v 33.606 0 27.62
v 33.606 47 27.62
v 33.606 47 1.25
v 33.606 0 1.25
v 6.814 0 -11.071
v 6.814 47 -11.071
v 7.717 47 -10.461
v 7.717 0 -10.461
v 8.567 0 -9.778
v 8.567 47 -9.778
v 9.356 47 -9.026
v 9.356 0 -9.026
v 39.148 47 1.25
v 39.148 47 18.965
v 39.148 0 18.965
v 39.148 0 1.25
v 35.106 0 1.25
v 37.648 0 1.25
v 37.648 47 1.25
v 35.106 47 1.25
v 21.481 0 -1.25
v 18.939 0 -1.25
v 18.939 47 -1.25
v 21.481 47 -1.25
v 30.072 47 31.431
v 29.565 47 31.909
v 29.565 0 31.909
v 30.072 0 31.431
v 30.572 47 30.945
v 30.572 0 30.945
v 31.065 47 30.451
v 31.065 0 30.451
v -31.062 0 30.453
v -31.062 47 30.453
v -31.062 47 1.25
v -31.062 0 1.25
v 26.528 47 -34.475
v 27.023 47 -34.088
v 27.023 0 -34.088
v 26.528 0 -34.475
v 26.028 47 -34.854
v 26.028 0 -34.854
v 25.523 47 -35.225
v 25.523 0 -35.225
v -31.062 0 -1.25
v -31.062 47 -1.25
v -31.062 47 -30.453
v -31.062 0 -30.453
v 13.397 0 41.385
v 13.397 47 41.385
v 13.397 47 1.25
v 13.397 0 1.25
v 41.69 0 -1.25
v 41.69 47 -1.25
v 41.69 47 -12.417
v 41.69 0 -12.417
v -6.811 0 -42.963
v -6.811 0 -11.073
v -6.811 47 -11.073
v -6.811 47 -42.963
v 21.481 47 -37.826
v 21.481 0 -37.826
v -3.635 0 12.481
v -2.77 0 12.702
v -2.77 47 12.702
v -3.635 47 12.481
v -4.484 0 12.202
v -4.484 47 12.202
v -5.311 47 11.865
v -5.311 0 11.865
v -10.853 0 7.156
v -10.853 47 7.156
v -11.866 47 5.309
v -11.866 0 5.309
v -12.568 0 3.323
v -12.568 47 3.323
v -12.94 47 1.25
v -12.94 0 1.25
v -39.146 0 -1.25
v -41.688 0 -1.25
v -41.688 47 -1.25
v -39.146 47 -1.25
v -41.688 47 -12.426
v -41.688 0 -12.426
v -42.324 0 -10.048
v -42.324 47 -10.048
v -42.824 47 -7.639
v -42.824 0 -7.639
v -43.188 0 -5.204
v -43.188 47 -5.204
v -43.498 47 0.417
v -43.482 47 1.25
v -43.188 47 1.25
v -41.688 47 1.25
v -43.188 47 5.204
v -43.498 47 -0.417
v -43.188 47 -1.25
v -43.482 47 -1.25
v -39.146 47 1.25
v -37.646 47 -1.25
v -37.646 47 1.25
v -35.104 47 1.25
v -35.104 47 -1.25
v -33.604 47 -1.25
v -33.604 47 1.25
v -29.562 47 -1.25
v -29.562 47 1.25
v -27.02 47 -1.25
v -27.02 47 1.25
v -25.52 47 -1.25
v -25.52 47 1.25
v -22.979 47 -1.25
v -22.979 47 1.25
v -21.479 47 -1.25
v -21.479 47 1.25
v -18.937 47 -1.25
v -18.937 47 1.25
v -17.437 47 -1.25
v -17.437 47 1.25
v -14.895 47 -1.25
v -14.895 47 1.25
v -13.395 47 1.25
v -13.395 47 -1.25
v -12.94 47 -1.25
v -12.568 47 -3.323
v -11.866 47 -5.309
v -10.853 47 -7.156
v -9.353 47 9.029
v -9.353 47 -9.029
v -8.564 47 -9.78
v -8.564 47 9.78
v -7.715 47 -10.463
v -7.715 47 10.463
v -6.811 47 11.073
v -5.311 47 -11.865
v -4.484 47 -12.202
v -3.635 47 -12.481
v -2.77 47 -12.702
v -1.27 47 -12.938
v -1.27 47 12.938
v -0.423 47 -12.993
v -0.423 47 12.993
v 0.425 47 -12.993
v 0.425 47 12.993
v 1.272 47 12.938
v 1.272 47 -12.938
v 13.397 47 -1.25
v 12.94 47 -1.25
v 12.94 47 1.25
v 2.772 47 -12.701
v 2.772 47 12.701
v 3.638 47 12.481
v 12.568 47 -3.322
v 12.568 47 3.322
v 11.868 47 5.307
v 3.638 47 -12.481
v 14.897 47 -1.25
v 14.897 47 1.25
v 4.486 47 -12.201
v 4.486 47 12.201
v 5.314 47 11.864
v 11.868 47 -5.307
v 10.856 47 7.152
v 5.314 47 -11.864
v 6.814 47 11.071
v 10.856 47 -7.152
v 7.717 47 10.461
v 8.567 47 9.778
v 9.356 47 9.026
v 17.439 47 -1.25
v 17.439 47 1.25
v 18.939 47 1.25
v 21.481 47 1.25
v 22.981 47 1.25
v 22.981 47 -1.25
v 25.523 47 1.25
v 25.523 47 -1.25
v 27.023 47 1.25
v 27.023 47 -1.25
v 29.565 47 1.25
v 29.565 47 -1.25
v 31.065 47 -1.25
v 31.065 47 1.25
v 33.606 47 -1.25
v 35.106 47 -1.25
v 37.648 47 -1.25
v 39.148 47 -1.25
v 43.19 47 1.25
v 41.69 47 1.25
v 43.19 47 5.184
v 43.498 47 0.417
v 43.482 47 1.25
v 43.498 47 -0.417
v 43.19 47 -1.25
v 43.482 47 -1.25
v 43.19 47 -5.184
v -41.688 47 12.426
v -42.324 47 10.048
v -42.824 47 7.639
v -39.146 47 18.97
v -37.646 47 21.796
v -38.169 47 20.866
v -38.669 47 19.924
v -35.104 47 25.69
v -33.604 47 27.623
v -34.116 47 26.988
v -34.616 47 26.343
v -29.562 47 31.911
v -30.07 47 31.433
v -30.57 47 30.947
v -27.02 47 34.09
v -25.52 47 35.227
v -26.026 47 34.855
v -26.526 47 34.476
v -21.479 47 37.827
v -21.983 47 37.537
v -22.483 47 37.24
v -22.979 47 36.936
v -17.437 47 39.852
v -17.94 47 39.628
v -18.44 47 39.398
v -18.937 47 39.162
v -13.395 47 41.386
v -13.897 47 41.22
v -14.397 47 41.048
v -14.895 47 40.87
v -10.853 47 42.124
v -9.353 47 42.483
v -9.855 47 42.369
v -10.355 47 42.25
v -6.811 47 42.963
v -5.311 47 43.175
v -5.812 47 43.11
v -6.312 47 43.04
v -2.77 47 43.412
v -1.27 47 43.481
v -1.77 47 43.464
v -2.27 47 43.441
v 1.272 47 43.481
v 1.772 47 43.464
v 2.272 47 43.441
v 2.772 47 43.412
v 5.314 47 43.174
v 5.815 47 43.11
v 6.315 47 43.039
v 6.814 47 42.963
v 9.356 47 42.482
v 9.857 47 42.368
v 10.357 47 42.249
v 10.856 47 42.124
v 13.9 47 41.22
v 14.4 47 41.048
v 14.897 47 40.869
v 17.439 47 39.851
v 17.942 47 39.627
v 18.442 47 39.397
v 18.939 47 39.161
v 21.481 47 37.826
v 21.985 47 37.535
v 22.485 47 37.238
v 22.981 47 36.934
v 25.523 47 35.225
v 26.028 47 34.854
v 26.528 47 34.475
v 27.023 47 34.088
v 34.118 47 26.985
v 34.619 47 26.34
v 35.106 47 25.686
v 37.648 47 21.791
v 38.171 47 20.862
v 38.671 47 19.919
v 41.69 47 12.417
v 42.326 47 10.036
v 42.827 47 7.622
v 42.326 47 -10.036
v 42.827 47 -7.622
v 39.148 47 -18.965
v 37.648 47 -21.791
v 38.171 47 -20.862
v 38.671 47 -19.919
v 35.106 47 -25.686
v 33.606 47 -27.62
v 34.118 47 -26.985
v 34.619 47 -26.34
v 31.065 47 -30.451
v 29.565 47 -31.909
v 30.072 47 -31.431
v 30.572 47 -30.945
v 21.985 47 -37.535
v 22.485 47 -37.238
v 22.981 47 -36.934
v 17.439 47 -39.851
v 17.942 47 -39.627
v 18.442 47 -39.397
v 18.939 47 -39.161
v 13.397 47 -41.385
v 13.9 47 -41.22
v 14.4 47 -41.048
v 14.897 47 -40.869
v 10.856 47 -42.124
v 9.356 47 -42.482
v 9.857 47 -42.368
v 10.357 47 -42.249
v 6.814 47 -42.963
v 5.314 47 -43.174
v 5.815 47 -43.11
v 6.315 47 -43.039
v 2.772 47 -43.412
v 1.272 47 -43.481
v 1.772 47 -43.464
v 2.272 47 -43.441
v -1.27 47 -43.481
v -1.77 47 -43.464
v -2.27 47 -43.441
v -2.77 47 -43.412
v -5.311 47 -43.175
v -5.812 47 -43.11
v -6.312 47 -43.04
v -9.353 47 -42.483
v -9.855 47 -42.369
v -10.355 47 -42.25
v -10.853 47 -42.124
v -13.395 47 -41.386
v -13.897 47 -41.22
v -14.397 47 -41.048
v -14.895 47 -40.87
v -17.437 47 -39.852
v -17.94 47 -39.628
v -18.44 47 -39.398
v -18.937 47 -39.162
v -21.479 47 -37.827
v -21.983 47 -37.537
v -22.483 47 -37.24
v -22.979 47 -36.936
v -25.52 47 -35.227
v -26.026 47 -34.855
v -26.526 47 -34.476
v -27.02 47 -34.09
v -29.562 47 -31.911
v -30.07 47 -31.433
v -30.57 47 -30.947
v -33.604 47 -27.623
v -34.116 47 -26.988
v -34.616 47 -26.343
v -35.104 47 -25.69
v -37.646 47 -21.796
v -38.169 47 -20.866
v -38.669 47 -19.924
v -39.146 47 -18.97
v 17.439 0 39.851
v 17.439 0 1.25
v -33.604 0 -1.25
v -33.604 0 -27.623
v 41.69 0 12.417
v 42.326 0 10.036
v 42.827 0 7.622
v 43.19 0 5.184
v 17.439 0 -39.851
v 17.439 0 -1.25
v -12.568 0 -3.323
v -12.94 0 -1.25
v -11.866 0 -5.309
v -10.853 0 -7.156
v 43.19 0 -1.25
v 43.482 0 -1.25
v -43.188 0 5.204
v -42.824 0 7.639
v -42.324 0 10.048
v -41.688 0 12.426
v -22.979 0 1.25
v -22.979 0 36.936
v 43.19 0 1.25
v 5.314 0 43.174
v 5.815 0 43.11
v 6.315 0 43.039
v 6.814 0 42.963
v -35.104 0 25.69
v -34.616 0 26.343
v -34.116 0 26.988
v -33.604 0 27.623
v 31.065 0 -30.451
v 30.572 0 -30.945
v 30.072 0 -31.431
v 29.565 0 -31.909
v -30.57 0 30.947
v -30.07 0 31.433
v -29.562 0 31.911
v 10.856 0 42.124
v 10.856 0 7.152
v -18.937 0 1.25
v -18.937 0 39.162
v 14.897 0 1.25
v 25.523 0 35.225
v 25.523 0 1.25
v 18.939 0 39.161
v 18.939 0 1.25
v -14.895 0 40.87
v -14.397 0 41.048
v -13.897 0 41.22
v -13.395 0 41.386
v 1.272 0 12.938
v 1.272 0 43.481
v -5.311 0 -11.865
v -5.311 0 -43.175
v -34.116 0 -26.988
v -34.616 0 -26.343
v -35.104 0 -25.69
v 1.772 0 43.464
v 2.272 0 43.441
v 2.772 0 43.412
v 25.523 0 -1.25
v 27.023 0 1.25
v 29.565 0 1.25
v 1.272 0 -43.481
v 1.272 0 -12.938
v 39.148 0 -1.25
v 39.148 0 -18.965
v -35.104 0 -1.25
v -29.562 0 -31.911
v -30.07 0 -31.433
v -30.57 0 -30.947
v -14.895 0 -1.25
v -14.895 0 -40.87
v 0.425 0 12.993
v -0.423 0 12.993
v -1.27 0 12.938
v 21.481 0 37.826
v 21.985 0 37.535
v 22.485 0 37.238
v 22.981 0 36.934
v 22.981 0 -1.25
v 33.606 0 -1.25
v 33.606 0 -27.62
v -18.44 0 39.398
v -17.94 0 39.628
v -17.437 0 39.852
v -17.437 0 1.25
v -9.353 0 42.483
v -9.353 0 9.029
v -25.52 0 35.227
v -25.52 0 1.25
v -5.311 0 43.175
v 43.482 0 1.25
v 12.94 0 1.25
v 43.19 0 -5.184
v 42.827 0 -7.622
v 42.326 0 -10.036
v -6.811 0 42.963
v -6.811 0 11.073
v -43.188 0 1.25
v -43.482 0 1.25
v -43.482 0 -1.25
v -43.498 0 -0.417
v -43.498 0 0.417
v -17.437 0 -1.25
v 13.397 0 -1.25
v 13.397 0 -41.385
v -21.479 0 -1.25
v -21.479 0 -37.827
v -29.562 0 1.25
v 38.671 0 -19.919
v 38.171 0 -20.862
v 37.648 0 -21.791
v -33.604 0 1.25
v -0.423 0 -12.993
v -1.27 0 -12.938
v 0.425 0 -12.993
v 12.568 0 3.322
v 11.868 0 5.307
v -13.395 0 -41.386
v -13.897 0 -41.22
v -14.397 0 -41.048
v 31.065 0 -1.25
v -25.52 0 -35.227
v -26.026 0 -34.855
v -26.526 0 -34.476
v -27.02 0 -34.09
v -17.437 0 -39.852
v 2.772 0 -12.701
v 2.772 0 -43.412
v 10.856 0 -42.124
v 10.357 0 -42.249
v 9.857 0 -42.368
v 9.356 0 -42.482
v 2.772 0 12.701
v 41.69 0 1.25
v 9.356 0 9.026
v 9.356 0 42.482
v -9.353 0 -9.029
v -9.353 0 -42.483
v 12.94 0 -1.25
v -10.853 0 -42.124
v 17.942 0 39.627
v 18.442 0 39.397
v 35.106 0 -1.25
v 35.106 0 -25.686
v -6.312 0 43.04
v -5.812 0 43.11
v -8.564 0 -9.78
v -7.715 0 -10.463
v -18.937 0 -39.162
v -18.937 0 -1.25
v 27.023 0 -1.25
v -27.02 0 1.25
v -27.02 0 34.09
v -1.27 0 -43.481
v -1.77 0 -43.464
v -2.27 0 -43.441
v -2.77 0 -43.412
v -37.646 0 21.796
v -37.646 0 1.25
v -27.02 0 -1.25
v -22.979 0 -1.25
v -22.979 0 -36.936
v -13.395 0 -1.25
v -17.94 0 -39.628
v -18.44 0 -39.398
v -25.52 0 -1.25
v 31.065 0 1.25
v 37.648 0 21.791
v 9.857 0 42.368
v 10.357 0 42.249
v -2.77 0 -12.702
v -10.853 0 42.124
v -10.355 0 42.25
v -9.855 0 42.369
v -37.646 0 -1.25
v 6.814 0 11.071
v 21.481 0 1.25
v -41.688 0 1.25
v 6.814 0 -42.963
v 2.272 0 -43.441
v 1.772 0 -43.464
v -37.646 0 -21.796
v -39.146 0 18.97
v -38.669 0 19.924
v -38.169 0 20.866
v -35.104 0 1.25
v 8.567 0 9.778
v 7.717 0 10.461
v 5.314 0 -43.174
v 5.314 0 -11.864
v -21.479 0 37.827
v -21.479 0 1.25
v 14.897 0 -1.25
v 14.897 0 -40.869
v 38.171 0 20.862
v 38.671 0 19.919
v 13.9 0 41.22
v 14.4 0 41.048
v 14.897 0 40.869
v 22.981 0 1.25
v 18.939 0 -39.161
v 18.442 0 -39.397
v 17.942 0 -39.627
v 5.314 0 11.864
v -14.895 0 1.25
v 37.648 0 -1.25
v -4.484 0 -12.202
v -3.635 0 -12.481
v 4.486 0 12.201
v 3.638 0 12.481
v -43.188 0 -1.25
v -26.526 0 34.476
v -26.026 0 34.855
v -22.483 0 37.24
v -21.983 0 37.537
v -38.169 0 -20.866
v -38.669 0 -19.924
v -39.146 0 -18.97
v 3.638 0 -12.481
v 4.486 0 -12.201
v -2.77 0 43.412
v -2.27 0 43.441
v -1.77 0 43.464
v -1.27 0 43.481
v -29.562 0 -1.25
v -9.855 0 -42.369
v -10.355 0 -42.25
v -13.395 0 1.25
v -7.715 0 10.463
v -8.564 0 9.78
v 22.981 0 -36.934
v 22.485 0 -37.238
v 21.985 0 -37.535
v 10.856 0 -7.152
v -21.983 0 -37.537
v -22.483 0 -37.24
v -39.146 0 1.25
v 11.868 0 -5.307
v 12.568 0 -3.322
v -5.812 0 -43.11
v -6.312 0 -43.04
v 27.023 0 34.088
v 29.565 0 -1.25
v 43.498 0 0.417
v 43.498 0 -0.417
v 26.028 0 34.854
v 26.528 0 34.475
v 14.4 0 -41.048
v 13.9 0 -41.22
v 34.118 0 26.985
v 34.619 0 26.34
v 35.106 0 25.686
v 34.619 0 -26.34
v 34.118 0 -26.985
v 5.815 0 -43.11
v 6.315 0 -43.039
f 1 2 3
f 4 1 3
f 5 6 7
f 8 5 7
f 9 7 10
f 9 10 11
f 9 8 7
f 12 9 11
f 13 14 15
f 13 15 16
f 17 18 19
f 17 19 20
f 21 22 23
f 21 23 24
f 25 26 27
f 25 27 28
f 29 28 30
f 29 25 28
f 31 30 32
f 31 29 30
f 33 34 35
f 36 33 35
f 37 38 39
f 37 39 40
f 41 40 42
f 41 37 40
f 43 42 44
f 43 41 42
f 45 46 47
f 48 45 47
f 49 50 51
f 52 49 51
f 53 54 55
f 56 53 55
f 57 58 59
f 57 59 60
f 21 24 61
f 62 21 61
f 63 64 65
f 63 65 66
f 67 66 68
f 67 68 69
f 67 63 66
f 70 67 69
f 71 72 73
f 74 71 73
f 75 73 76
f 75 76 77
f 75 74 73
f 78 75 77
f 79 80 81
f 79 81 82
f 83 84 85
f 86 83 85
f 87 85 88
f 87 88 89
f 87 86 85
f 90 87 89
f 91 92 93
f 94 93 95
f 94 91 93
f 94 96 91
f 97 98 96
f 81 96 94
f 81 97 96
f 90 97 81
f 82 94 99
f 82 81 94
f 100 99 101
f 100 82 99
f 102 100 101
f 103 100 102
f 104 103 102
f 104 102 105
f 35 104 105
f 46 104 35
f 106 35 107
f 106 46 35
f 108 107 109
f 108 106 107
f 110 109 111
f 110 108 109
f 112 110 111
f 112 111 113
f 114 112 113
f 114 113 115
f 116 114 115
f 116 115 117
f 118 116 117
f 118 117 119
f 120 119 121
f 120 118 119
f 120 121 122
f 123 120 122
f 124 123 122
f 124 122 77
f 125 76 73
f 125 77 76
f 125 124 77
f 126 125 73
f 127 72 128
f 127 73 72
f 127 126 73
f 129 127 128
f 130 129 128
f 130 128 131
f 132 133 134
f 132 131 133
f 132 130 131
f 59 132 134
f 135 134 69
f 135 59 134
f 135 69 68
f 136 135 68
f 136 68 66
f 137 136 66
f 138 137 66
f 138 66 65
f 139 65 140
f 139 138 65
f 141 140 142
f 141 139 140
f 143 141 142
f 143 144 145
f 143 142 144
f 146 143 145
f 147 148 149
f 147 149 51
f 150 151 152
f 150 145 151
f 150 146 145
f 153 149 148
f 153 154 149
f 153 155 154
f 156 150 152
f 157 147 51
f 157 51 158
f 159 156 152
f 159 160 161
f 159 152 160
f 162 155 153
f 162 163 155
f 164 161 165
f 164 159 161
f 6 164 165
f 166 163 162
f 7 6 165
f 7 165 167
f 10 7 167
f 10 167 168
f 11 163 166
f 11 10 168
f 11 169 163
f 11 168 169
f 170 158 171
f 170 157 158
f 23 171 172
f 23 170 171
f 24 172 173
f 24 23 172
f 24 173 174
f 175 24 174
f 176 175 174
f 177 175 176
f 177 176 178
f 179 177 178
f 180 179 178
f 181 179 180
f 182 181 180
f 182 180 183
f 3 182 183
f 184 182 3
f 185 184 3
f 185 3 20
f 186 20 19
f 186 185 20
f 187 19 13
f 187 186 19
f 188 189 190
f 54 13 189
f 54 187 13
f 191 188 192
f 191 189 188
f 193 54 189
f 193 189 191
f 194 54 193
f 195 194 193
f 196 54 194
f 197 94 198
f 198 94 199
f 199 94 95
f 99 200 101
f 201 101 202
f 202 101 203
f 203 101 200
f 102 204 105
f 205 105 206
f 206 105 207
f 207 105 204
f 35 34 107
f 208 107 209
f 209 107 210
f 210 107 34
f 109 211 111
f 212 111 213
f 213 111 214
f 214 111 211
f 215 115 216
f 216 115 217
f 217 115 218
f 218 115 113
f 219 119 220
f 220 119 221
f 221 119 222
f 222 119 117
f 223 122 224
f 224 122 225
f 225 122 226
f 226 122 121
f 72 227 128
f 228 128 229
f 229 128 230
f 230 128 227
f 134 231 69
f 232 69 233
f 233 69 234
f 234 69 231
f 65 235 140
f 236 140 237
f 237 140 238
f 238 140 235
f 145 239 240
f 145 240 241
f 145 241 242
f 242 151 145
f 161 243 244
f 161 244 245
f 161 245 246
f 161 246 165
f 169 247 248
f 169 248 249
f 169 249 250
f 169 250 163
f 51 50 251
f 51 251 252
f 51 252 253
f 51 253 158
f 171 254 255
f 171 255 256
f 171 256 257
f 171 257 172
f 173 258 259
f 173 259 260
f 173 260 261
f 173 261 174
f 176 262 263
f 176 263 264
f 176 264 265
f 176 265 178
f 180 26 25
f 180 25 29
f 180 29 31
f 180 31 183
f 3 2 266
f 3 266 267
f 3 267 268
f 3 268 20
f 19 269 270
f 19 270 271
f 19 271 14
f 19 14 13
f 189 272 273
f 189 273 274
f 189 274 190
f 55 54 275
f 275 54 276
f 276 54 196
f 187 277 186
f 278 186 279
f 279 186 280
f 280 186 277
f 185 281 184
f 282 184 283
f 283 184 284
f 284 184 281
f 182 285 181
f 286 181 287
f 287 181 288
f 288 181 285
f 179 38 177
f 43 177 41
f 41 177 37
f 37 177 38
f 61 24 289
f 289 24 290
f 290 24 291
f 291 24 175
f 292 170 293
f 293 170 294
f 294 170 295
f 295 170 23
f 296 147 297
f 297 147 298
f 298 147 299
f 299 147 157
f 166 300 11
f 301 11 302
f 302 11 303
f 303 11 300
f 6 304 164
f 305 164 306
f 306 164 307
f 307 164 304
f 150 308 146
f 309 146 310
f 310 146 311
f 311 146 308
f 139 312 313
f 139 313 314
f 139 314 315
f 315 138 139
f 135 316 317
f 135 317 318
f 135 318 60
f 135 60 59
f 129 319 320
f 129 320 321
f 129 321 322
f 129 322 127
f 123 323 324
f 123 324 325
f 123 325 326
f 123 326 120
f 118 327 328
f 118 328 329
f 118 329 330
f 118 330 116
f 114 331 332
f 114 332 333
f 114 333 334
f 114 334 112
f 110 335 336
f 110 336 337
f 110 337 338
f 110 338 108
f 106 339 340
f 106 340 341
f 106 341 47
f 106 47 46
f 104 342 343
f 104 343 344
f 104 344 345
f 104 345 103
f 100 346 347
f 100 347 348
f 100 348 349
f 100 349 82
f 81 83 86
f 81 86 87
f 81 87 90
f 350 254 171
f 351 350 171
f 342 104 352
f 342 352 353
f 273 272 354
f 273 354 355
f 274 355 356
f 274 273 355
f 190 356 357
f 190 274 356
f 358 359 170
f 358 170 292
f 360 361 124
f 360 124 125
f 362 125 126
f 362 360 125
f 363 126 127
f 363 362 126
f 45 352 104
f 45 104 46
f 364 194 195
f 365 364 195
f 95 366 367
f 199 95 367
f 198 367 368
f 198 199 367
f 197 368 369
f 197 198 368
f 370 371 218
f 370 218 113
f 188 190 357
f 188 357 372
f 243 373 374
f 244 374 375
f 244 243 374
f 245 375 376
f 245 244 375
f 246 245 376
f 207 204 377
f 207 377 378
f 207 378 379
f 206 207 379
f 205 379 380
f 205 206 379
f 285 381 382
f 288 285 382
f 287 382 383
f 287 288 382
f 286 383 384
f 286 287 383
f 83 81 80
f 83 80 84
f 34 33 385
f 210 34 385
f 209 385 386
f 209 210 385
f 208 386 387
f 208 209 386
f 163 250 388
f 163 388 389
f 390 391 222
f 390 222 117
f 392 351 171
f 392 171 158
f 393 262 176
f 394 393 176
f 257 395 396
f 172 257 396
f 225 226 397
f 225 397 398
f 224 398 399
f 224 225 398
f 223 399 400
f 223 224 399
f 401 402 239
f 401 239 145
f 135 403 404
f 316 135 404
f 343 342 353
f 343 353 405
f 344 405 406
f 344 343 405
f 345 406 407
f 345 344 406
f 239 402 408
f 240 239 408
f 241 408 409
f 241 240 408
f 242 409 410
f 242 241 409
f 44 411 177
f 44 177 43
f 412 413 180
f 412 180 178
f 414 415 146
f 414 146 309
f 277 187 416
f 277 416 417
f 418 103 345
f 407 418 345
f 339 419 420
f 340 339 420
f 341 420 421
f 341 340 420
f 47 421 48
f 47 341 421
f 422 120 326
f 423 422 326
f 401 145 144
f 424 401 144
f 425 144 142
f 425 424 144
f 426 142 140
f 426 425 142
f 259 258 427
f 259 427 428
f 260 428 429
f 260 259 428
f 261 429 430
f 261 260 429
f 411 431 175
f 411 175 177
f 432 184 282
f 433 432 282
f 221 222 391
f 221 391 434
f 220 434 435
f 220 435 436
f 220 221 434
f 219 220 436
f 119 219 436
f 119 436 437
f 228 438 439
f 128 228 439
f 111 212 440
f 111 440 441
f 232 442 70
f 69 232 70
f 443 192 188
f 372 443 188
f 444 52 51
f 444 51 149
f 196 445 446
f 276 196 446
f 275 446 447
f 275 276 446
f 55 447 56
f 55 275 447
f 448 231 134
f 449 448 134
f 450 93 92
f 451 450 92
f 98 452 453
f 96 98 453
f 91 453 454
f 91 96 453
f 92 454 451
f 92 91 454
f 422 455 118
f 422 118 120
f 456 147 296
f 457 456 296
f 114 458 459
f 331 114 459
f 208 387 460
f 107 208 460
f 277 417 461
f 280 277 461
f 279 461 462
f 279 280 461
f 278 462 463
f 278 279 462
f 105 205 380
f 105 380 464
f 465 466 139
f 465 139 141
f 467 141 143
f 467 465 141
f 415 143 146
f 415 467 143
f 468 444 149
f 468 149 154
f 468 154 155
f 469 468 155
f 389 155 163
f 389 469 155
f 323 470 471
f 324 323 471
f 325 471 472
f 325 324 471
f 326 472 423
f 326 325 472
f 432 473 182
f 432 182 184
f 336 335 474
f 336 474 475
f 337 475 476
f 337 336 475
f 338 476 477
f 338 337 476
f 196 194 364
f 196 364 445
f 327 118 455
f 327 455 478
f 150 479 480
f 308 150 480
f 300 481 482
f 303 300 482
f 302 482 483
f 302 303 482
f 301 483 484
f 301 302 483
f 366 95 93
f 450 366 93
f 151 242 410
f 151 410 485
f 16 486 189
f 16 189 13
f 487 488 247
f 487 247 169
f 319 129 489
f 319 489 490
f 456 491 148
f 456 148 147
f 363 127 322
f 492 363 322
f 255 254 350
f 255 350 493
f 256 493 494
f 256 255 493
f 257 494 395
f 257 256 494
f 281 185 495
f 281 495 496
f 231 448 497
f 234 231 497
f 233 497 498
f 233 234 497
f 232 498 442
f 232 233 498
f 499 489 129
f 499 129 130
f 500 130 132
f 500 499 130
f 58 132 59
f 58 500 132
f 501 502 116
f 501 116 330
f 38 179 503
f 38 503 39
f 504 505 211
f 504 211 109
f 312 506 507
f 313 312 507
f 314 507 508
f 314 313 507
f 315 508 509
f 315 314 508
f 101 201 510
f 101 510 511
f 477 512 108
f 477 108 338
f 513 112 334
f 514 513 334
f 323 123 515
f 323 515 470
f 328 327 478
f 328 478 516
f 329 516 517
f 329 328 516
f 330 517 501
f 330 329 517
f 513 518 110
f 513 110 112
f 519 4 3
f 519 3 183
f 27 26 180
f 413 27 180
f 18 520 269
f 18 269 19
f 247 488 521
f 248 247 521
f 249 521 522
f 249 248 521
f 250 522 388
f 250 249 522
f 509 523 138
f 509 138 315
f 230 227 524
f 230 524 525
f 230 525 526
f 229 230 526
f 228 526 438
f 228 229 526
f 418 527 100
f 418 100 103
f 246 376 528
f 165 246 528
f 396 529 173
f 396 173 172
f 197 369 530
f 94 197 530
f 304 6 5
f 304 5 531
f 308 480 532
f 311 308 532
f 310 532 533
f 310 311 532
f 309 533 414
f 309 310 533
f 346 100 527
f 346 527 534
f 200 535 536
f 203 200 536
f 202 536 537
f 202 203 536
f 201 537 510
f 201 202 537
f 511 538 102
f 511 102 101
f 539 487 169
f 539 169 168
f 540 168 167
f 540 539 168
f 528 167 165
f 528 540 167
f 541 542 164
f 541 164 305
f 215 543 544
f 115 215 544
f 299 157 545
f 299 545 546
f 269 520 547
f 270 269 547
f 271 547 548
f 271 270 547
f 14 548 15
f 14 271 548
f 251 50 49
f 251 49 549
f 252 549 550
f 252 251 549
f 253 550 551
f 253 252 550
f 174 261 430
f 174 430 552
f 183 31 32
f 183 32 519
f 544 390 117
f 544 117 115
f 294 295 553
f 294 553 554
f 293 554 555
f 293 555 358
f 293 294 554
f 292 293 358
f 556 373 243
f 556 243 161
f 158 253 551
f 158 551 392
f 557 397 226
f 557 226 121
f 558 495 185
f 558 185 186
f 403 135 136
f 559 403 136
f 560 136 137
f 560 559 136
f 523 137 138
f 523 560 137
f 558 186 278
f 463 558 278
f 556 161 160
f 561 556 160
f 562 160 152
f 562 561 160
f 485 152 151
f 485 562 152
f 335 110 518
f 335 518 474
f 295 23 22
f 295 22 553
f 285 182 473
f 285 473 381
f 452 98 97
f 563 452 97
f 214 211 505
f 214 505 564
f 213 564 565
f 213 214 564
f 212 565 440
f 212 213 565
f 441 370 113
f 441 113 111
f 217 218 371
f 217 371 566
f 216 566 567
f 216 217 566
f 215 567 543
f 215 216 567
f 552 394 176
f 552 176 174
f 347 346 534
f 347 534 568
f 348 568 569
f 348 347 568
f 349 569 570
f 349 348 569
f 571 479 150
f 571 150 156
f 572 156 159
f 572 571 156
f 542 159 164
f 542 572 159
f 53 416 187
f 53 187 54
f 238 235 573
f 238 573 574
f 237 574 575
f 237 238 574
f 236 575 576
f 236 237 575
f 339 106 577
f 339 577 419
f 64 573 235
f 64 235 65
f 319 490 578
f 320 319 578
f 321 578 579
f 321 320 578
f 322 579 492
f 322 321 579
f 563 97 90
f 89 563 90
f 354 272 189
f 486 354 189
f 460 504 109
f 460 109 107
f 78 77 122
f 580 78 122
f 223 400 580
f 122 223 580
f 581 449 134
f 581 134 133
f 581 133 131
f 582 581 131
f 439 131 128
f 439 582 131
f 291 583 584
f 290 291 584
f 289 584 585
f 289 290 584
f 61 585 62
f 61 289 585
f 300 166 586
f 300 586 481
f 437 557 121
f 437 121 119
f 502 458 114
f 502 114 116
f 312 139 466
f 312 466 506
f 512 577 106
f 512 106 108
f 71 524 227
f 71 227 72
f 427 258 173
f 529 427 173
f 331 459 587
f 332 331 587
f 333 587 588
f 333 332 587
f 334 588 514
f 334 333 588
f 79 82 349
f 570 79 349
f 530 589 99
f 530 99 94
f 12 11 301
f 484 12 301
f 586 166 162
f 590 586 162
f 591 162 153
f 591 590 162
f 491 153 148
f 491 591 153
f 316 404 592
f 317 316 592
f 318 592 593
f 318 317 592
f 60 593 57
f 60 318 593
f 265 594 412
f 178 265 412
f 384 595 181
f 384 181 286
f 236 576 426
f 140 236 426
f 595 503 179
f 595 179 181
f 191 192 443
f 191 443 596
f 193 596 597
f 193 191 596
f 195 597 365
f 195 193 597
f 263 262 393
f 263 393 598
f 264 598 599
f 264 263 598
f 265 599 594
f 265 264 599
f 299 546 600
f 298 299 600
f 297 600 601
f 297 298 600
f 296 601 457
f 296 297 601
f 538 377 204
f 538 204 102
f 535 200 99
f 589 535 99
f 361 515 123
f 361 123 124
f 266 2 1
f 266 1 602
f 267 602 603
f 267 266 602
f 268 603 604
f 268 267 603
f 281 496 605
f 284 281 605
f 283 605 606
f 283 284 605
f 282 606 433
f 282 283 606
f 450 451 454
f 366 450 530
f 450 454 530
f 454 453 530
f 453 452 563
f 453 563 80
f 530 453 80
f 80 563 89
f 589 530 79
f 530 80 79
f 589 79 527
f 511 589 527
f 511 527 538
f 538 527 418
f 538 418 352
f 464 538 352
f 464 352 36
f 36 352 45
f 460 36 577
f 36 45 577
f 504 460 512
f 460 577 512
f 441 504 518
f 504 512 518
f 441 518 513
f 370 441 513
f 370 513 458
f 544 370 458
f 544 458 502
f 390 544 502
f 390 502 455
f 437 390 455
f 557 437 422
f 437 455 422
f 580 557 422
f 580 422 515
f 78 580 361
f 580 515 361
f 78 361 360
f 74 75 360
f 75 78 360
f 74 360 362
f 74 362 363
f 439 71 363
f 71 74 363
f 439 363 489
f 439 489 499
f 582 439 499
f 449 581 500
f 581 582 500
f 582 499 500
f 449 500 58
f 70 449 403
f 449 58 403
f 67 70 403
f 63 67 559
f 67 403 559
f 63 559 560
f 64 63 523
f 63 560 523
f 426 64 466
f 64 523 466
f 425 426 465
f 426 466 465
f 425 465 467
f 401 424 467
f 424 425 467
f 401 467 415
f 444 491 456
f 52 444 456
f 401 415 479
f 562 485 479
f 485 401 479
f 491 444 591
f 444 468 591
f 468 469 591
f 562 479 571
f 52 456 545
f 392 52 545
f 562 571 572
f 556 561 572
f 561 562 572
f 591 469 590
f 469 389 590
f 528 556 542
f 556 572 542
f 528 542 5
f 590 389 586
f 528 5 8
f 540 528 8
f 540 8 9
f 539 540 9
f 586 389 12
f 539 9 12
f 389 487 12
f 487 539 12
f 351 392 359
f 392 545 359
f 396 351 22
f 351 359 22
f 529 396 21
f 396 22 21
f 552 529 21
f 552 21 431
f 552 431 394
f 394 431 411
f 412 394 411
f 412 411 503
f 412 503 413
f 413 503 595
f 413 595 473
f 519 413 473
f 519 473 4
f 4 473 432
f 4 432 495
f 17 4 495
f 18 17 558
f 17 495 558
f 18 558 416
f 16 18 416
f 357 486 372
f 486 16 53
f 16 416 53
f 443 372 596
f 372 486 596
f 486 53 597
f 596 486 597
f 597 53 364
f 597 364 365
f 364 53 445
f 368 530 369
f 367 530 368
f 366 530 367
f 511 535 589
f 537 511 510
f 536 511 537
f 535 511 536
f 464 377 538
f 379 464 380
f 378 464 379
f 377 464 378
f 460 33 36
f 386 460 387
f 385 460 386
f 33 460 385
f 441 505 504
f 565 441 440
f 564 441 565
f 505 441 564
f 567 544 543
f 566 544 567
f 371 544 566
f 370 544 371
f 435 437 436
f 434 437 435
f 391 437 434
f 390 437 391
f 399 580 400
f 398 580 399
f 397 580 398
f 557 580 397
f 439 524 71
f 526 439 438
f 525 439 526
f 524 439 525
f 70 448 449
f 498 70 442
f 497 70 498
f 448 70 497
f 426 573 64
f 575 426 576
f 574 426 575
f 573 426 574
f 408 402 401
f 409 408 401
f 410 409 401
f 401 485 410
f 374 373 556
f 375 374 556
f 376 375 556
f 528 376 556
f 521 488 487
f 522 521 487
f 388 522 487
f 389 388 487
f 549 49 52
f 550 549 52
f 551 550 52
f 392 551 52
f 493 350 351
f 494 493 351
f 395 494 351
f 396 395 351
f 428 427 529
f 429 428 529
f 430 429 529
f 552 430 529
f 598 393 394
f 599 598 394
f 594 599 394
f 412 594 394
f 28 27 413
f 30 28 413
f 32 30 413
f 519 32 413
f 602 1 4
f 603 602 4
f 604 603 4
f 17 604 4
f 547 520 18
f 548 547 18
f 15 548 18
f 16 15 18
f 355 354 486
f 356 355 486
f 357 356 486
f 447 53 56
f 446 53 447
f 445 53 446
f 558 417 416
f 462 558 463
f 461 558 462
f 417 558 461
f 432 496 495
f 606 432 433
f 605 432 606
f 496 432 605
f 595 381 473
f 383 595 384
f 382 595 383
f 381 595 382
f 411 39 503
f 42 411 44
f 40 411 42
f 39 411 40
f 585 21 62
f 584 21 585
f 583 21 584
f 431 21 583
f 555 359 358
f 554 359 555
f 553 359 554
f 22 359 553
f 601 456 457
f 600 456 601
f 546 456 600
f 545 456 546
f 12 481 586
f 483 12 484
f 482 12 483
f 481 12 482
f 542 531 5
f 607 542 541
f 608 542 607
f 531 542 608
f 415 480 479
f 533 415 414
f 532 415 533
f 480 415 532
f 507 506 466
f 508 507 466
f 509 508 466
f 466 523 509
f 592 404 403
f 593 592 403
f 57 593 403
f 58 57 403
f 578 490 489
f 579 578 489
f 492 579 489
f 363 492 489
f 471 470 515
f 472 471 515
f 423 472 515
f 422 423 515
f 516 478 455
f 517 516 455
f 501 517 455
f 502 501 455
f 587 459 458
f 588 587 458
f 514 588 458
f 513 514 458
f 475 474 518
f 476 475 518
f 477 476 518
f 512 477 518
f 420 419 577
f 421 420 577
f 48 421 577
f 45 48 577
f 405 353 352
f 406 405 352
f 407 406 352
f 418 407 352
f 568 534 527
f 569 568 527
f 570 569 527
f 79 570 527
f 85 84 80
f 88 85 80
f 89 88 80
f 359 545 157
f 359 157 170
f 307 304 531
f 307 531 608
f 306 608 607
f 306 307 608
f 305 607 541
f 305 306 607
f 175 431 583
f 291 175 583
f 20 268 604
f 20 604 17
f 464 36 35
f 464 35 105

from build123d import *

# Parameters (mm, degrees)
SALIENTE_EXTRUIR3_DEPTH = 47
CROQUIS4_W              = 1.5
CROQUIS4_H              = 87
SALIENTE_EXTRUIR4_DEPTH = 47
CROQUIS5_OUTSIDE_W      = 115.342
CROQUIS5_OUTSIDE_H      = 115.342
CROQUIS5_OUTSIDE_R      = 43.5
CORTAR_EXTRUIR1_DEPTH   = 47


with BuildPart() as part:
    # Croquis3 → Saliente-Extruir3 (new body)
    with BuildSketch(Plane(origin=(0, 0, 0), x_dir=(1, 0, 0), z_dir=(0, 1, 0))):
        with BuildLine():
            Line((-43.5, 1.25), (-12.939764295, 1.25))
            ThreePointArc((-12.939764295, 1.25), (0, 13), (12.939764295, 1.25))
            Line((12.939764295, 1.25), (43.5, 1.25))
            Line((43.5, 1.25), (43.5, -1.25))
            Line((43.5, -1.25), (12.939764295, -1.25))
            ThreePointArc((12.939764295, -1.25), (0, -13), (-12.939764295, -1.25))
            Line((-12.939764295, -1.25), (-43.5, -1.25))
            Line((-43.5, -1.25), (-43.5, 1.25))
        make_face()
    extrude(amount=SALIENTE_EXTRUIR3_DEPTH)

    # Croquis4 → Saliente-Extruir4 (add)
    with BuildSketch(Plane(origin=(0, 47, 0), x_dir=(1, 0, 0), z_dir=(0, 1, 0))):
        with Locations((-42.437546, 0)):
            Rectangle(CROQUIS4_W, CROQUIS4_H)
        with Locations((-38.395758095, 0)):
            Rectangle(CROQUIS4_W, CROQUIS4_H)
        with Locations((-34.35397019, 0)):
            Rectangle(CROQUIS4_W, CROQUIS4_H)
        with Locations((-30.312182286, 0)):
            Rectangle(CROQUIS4_W, CROQUIS4_H)
        with Locations((-26.270394381, 0)):
            Rectangle(CROQUIS4_W, CROQUIS4_H)
        with Locations((-22.228606476, 0)):
            Rectangle(CROQUIS4_W, CROQUIS4_H)
        with Locations((-18.186818571, 0)):
            Rectangle(CROQUIS4_W, CROQUIS4_H)
        with Locations((-14.145030667, 0)):
            Rectangle(CROQUIS4_W, CROQUIS4_H)
        with Locations((-10.103242762, 0)):
            Rectangle(CROQUIS4_W, CROQUIS4_H)
        with Locations((-6.061454857, 0)):
            Rectangle(CROQUIS4_W, CROQUIS4_H)
        with Locations((-2.019666952, 0)):
            Rectangle(CROQUIS4_W, CROQUIS4_H)
        with Locations((2.022120952, 0)):
            Rectangle(CROQUIS4_W, CROQUIS4_H)
        with Locations((6.063908857, 0)):
            Rectangle(CROQUIS4_W, CROQUIS4_H)
        with Locations((10.105696762, 0)):
            Rectangle(CROQUIS4_W, CROQUIS4_H)
        with Locations((14.147484667, 0)):
            Rectangle(CROQUIS4_W, CROQUIS4_H)
        with Locations((18.189272571, 0)):
            Rectangle(CROQUIS4_W, CROQUIS4_H)
        with Locations((22.231060476, 0)):
            Rectangle(CROQUIS4_W, CROQUIS4_H)
        with Locations((26.272848381, 0)):
            Rectangle(CROQUIS4_W, CROQUIS4_H)
        with Locations((30.314636286, 0)):
            Rectangle(CROQUIS4_W, CROQUIS4_H)
        with Locations((34.35642419, 0)):
            Rectangle(CROQUIS4_W, CROQUIS4_H)
        with Locations((38.398212095, 0)):
            Rectangle(CROQUIS4_W, CROQUIS4_H)
        with Locations((42.44, 0)):
            Rectangle(CROQUIS4_W, CROQUIS4_H)
    extrude(amount=-SALIENTE_EXTRUIR4_DEPTH)

    # Croquis5 outside → Cortar-Extruir1 (cut)
    with BuildSketch(Plane(origin=(0, 47, 0), x_dir=(1, 0, 0), z_dir=(0, 1, 0))):
        Rectangle(CROQUIS5_OUTSIDE_W, CROQUIS5_OUTSIDE_H)
        Circle(CROQUIS5_OUTSIDE_R, mode=Mode.SUBTRACT)
    extrude(amount=-CORTAR_EXTRUIR1_DEPTH, mode=Mode.SUBTRACT)


solid = part.part
